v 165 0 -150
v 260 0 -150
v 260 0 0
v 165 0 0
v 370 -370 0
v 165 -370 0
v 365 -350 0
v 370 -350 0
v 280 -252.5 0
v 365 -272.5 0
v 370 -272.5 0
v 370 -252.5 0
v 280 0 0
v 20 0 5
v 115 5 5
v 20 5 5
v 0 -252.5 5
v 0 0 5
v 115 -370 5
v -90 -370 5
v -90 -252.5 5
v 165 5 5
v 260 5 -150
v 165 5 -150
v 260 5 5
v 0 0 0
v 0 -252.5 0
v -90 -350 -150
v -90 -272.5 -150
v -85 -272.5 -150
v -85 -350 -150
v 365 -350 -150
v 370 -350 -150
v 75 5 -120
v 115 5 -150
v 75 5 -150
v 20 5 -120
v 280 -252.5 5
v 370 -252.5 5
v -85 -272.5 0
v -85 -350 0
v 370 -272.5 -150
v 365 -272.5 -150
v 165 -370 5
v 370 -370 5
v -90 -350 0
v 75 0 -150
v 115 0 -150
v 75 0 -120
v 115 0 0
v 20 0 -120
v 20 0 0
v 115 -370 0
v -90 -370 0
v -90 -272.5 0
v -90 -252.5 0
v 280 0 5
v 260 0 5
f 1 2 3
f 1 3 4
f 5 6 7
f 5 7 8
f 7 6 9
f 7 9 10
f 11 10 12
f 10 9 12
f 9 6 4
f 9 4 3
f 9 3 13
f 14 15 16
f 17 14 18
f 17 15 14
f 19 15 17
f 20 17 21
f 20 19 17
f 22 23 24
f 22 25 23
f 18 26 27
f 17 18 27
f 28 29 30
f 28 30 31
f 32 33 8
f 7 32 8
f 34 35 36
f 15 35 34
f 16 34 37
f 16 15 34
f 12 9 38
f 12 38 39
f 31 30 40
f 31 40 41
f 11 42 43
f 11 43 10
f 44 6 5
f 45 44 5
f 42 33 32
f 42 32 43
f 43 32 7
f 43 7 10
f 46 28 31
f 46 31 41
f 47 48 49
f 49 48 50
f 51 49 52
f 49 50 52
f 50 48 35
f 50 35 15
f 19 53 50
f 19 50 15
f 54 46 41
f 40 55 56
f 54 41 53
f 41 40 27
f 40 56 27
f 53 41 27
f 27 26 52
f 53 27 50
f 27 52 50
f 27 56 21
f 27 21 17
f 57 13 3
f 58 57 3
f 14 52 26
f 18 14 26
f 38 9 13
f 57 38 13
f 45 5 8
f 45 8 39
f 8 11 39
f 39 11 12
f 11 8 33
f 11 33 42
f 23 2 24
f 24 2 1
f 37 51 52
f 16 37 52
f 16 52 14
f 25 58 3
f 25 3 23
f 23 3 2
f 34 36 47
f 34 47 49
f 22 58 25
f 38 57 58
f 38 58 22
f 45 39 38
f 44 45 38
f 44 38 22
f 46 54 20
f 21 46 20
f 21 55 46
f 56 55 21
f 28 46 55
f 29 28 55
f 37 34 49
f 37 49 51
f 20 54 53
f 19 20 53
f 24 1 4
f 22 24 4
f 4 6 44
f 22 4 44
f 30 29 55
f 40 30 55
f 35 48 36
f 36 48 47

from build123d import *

# Parameters (mm, degrees)
F0_W      = 90
F0_H      = 117.5
F1_DEPTH  = 5
F2_W      = 50
F2_H      = 370
F3_DEPTH  = 25
F5_W      = 77.5
F5_H      = 150
F7_DEPTH  = 5
F4_W      = 95
F4_H      = 150
F4_H_2    = 155
F4_H_3    = 5
F8_DEPTH  = 5
F6_W      = 77.5
F6_H      = 150
F9_DEPTH  = 5
F10_W     = 55
F10_H     = 30
F11_DEPTH = 25


with BuildPart() as f1:
    # F0 (on Top) → F1 (new body)
    with BuildSketch(Plane.XY):
        Polygon((280, 0), (0, 0), (0, -252.5), (0, -370), (280, -370), (280, -252.5), align=None)
        with Locations((-45, -311.25)):
            Rectangle(F0_W, F0_H)
        with Locations((325, -311.25)):
            Rectangle(F0_W, F0_H)
    extrude(amount=F1_DEPTH)

    # F2 (on face) → F3 (cut)
    with BuildSketch(Plane.XY.offset(5)):
        with Locations((140, -185)):
            Rectangle(F2_W, F2_H)
    extrude(amount=-F3_DEPTH, mode=Mode.SUBTRACT)

    # F5 (on face) → F7 (join)
    with BuildSketch(Plane(origin=(-90, 0, 0), x_dir=(0, -1, 0), z_dir=(-1, 0, 0))):
        with Locations((311.25, -75)):
            Rectangle(F5_W, F5_H)
    extrude(amount=-F7_DEPTH)

    # F4 (on face) → F8 (join)
    with BuildSketch(Plane(origin=(0, 0, 0), x_dir=(-1, 0, 0), z_dir=(0, 1, 0))):
        with Locations((-212.5, -75)):
            Rectangle(F4_W, F4_H)
        with Locations((-67.5, -72.5)):
            Rectangle(F4_W, F4_H_2)
        with Locations((-212.5, 2.5)):
            Rectangle(F4_W, F4_H_3)
    extrude(amount=F8_DEPTH)

    # F6 (on face) → F9 (join)
    with BuildSketch(Plane.YZ.offset(370)):
        with Locations((-311.25, -75)):
            Rectangle(F6_W, F6_H)
    extrude(amount=-F9_DEPTH)

    # F10 (on face) → F11 (cut)
    with BuildSketch(Plane(origin=(0, 5, 0), x_dir=(-1, 0, 0), z_dir=(0, 1, 0))):
        with Locations((-47.5, -135)):
            Rectangle(F10_W, F10_H)
    extrude(amount=-F11_DEPTH, mode=Mode.SUBTRACT)


solid = f1.part
